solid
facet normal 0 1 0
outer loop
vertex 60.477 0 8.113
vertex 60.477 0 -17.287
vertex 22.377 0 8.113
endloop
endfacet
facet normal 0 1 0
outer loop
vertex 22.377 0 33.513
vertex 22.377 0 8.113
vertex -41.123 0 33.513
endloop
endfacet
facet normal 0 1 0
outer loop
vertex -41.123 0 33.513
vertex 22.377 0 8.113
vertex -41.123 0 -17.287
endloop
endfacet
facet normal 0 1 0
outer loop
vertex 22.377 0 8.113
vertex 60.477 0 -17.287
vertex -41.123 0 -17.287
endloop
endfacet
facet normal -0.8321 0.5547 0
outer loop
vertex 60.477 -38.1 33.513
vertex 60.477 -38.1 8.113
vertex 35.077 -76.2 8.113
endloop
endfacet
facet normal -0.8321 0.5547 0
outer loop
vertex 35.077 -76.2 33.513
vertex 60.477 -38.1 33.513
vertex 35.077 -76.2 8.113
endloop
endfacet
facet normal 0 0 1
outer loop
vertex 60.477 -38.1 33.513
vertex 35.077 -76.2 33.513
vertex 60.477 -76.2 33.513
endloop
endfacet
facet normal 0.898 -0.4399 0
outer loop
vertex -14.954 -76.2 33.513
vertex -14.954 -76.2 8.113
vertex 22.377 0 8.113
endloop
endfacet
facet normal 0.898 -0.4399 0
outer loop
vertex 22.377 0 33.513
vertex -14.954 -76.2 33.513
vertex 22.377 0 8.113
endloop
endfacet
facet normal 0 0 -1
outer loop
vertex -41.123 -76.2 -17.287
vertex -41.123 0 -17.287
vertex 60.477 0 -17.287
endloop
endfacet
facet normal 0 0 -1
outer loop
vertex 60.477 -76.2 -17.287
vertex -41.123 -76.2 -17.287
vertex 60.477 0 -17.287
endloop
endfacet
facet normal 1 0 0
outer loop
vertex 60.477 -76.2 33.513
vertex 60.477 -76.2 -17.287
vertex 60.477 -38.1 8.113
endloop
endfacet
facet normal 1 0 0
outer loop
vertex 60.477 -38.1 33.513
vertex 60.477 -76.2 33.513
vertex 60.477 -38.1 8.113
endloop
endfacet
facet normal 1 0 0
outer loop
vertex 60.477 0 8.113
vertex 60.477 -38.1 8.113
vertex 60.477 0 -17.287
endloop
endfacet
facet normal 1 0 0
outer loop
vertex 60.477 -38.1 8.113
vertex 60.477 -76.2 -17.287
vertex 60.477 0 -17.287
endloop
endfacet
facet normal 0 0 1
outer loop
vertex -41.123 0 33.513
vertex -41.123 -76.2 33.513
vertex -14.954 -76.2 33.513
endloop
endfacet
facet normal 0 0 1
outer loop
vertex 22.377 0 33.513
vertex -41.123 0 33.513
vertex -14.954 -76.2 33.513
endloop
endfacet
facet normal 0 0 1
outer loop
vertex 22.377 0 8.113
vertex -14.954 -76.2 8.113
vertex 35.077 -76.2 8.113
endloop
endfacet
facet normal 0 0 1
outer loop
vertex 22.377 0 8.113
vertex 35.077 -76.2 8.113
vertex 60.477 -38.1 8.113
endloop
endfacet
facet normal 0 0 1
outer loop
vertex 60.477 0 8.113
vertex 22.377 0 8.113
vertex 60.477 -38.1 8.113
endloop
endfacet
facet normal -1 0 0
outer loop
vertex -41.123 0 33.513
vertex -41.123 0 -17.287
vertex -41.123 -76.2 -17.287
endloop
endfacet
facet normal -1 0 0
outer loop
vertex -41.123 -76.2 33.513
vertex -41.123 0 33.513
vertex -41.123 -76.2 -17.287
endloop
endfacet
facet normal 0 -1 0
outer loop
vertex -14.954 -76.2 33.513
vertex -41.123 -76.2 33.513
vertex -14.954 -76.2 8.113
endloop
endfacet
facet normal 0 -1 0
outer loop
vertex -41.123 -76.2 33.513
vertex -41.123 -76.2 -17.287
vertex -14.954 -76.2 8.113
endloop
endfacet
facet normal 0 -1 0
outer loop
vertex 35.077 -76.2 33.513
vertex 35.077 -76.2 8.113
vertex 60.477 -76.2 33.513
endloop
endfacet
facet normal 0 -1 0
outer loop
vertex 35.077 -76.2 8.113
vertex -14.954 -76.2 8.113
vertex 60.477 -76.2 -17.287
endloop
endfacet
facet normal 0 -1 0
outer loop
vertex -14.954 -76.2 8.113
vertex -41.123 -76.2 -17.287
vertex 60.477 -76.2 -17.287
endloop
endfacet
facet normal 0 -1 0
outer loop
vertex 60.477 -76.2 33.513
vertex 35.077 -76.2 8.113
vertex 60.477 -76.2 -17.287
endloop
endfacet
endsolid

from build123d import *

# Parameters (mm, degrees)
F0_W     = 101.6
F0_H     = 25.4
F1_DEPTH = 76.2
F3_DEPTH = 25.4
F5_DEPTH = 25.4


with BuildPart() as f1:
    # F0 (on Front) → F1 (new body)
    with BuildSketch(Plane.XZ):
        with Locations((9.67671, -4.587205)):
            Rectangle(F0_W, F0_H)
    extrude(amount=F1_DEPTH)

    # F2 (on face) → F3 (join)
    with BuildSketch(Plane.XY.offset(8.112795)):
        Polygon((60.47671, -38.1), (35.07671, -76.2), (60.47671, -76.2), align=None)
    extrude(amount=F3_DEPTH)

    # F4 (on face) → F5 (join)
    with BuildSketch(Plane.XY.offset(8.112795)):
        Polygon((-41.12329, 0), (-41.12329, -76.2), (-14.954321, -76.2), (22.37671, 0), align=None)
    extrude(amount=F5_DEPTH)


solid = f1.part
